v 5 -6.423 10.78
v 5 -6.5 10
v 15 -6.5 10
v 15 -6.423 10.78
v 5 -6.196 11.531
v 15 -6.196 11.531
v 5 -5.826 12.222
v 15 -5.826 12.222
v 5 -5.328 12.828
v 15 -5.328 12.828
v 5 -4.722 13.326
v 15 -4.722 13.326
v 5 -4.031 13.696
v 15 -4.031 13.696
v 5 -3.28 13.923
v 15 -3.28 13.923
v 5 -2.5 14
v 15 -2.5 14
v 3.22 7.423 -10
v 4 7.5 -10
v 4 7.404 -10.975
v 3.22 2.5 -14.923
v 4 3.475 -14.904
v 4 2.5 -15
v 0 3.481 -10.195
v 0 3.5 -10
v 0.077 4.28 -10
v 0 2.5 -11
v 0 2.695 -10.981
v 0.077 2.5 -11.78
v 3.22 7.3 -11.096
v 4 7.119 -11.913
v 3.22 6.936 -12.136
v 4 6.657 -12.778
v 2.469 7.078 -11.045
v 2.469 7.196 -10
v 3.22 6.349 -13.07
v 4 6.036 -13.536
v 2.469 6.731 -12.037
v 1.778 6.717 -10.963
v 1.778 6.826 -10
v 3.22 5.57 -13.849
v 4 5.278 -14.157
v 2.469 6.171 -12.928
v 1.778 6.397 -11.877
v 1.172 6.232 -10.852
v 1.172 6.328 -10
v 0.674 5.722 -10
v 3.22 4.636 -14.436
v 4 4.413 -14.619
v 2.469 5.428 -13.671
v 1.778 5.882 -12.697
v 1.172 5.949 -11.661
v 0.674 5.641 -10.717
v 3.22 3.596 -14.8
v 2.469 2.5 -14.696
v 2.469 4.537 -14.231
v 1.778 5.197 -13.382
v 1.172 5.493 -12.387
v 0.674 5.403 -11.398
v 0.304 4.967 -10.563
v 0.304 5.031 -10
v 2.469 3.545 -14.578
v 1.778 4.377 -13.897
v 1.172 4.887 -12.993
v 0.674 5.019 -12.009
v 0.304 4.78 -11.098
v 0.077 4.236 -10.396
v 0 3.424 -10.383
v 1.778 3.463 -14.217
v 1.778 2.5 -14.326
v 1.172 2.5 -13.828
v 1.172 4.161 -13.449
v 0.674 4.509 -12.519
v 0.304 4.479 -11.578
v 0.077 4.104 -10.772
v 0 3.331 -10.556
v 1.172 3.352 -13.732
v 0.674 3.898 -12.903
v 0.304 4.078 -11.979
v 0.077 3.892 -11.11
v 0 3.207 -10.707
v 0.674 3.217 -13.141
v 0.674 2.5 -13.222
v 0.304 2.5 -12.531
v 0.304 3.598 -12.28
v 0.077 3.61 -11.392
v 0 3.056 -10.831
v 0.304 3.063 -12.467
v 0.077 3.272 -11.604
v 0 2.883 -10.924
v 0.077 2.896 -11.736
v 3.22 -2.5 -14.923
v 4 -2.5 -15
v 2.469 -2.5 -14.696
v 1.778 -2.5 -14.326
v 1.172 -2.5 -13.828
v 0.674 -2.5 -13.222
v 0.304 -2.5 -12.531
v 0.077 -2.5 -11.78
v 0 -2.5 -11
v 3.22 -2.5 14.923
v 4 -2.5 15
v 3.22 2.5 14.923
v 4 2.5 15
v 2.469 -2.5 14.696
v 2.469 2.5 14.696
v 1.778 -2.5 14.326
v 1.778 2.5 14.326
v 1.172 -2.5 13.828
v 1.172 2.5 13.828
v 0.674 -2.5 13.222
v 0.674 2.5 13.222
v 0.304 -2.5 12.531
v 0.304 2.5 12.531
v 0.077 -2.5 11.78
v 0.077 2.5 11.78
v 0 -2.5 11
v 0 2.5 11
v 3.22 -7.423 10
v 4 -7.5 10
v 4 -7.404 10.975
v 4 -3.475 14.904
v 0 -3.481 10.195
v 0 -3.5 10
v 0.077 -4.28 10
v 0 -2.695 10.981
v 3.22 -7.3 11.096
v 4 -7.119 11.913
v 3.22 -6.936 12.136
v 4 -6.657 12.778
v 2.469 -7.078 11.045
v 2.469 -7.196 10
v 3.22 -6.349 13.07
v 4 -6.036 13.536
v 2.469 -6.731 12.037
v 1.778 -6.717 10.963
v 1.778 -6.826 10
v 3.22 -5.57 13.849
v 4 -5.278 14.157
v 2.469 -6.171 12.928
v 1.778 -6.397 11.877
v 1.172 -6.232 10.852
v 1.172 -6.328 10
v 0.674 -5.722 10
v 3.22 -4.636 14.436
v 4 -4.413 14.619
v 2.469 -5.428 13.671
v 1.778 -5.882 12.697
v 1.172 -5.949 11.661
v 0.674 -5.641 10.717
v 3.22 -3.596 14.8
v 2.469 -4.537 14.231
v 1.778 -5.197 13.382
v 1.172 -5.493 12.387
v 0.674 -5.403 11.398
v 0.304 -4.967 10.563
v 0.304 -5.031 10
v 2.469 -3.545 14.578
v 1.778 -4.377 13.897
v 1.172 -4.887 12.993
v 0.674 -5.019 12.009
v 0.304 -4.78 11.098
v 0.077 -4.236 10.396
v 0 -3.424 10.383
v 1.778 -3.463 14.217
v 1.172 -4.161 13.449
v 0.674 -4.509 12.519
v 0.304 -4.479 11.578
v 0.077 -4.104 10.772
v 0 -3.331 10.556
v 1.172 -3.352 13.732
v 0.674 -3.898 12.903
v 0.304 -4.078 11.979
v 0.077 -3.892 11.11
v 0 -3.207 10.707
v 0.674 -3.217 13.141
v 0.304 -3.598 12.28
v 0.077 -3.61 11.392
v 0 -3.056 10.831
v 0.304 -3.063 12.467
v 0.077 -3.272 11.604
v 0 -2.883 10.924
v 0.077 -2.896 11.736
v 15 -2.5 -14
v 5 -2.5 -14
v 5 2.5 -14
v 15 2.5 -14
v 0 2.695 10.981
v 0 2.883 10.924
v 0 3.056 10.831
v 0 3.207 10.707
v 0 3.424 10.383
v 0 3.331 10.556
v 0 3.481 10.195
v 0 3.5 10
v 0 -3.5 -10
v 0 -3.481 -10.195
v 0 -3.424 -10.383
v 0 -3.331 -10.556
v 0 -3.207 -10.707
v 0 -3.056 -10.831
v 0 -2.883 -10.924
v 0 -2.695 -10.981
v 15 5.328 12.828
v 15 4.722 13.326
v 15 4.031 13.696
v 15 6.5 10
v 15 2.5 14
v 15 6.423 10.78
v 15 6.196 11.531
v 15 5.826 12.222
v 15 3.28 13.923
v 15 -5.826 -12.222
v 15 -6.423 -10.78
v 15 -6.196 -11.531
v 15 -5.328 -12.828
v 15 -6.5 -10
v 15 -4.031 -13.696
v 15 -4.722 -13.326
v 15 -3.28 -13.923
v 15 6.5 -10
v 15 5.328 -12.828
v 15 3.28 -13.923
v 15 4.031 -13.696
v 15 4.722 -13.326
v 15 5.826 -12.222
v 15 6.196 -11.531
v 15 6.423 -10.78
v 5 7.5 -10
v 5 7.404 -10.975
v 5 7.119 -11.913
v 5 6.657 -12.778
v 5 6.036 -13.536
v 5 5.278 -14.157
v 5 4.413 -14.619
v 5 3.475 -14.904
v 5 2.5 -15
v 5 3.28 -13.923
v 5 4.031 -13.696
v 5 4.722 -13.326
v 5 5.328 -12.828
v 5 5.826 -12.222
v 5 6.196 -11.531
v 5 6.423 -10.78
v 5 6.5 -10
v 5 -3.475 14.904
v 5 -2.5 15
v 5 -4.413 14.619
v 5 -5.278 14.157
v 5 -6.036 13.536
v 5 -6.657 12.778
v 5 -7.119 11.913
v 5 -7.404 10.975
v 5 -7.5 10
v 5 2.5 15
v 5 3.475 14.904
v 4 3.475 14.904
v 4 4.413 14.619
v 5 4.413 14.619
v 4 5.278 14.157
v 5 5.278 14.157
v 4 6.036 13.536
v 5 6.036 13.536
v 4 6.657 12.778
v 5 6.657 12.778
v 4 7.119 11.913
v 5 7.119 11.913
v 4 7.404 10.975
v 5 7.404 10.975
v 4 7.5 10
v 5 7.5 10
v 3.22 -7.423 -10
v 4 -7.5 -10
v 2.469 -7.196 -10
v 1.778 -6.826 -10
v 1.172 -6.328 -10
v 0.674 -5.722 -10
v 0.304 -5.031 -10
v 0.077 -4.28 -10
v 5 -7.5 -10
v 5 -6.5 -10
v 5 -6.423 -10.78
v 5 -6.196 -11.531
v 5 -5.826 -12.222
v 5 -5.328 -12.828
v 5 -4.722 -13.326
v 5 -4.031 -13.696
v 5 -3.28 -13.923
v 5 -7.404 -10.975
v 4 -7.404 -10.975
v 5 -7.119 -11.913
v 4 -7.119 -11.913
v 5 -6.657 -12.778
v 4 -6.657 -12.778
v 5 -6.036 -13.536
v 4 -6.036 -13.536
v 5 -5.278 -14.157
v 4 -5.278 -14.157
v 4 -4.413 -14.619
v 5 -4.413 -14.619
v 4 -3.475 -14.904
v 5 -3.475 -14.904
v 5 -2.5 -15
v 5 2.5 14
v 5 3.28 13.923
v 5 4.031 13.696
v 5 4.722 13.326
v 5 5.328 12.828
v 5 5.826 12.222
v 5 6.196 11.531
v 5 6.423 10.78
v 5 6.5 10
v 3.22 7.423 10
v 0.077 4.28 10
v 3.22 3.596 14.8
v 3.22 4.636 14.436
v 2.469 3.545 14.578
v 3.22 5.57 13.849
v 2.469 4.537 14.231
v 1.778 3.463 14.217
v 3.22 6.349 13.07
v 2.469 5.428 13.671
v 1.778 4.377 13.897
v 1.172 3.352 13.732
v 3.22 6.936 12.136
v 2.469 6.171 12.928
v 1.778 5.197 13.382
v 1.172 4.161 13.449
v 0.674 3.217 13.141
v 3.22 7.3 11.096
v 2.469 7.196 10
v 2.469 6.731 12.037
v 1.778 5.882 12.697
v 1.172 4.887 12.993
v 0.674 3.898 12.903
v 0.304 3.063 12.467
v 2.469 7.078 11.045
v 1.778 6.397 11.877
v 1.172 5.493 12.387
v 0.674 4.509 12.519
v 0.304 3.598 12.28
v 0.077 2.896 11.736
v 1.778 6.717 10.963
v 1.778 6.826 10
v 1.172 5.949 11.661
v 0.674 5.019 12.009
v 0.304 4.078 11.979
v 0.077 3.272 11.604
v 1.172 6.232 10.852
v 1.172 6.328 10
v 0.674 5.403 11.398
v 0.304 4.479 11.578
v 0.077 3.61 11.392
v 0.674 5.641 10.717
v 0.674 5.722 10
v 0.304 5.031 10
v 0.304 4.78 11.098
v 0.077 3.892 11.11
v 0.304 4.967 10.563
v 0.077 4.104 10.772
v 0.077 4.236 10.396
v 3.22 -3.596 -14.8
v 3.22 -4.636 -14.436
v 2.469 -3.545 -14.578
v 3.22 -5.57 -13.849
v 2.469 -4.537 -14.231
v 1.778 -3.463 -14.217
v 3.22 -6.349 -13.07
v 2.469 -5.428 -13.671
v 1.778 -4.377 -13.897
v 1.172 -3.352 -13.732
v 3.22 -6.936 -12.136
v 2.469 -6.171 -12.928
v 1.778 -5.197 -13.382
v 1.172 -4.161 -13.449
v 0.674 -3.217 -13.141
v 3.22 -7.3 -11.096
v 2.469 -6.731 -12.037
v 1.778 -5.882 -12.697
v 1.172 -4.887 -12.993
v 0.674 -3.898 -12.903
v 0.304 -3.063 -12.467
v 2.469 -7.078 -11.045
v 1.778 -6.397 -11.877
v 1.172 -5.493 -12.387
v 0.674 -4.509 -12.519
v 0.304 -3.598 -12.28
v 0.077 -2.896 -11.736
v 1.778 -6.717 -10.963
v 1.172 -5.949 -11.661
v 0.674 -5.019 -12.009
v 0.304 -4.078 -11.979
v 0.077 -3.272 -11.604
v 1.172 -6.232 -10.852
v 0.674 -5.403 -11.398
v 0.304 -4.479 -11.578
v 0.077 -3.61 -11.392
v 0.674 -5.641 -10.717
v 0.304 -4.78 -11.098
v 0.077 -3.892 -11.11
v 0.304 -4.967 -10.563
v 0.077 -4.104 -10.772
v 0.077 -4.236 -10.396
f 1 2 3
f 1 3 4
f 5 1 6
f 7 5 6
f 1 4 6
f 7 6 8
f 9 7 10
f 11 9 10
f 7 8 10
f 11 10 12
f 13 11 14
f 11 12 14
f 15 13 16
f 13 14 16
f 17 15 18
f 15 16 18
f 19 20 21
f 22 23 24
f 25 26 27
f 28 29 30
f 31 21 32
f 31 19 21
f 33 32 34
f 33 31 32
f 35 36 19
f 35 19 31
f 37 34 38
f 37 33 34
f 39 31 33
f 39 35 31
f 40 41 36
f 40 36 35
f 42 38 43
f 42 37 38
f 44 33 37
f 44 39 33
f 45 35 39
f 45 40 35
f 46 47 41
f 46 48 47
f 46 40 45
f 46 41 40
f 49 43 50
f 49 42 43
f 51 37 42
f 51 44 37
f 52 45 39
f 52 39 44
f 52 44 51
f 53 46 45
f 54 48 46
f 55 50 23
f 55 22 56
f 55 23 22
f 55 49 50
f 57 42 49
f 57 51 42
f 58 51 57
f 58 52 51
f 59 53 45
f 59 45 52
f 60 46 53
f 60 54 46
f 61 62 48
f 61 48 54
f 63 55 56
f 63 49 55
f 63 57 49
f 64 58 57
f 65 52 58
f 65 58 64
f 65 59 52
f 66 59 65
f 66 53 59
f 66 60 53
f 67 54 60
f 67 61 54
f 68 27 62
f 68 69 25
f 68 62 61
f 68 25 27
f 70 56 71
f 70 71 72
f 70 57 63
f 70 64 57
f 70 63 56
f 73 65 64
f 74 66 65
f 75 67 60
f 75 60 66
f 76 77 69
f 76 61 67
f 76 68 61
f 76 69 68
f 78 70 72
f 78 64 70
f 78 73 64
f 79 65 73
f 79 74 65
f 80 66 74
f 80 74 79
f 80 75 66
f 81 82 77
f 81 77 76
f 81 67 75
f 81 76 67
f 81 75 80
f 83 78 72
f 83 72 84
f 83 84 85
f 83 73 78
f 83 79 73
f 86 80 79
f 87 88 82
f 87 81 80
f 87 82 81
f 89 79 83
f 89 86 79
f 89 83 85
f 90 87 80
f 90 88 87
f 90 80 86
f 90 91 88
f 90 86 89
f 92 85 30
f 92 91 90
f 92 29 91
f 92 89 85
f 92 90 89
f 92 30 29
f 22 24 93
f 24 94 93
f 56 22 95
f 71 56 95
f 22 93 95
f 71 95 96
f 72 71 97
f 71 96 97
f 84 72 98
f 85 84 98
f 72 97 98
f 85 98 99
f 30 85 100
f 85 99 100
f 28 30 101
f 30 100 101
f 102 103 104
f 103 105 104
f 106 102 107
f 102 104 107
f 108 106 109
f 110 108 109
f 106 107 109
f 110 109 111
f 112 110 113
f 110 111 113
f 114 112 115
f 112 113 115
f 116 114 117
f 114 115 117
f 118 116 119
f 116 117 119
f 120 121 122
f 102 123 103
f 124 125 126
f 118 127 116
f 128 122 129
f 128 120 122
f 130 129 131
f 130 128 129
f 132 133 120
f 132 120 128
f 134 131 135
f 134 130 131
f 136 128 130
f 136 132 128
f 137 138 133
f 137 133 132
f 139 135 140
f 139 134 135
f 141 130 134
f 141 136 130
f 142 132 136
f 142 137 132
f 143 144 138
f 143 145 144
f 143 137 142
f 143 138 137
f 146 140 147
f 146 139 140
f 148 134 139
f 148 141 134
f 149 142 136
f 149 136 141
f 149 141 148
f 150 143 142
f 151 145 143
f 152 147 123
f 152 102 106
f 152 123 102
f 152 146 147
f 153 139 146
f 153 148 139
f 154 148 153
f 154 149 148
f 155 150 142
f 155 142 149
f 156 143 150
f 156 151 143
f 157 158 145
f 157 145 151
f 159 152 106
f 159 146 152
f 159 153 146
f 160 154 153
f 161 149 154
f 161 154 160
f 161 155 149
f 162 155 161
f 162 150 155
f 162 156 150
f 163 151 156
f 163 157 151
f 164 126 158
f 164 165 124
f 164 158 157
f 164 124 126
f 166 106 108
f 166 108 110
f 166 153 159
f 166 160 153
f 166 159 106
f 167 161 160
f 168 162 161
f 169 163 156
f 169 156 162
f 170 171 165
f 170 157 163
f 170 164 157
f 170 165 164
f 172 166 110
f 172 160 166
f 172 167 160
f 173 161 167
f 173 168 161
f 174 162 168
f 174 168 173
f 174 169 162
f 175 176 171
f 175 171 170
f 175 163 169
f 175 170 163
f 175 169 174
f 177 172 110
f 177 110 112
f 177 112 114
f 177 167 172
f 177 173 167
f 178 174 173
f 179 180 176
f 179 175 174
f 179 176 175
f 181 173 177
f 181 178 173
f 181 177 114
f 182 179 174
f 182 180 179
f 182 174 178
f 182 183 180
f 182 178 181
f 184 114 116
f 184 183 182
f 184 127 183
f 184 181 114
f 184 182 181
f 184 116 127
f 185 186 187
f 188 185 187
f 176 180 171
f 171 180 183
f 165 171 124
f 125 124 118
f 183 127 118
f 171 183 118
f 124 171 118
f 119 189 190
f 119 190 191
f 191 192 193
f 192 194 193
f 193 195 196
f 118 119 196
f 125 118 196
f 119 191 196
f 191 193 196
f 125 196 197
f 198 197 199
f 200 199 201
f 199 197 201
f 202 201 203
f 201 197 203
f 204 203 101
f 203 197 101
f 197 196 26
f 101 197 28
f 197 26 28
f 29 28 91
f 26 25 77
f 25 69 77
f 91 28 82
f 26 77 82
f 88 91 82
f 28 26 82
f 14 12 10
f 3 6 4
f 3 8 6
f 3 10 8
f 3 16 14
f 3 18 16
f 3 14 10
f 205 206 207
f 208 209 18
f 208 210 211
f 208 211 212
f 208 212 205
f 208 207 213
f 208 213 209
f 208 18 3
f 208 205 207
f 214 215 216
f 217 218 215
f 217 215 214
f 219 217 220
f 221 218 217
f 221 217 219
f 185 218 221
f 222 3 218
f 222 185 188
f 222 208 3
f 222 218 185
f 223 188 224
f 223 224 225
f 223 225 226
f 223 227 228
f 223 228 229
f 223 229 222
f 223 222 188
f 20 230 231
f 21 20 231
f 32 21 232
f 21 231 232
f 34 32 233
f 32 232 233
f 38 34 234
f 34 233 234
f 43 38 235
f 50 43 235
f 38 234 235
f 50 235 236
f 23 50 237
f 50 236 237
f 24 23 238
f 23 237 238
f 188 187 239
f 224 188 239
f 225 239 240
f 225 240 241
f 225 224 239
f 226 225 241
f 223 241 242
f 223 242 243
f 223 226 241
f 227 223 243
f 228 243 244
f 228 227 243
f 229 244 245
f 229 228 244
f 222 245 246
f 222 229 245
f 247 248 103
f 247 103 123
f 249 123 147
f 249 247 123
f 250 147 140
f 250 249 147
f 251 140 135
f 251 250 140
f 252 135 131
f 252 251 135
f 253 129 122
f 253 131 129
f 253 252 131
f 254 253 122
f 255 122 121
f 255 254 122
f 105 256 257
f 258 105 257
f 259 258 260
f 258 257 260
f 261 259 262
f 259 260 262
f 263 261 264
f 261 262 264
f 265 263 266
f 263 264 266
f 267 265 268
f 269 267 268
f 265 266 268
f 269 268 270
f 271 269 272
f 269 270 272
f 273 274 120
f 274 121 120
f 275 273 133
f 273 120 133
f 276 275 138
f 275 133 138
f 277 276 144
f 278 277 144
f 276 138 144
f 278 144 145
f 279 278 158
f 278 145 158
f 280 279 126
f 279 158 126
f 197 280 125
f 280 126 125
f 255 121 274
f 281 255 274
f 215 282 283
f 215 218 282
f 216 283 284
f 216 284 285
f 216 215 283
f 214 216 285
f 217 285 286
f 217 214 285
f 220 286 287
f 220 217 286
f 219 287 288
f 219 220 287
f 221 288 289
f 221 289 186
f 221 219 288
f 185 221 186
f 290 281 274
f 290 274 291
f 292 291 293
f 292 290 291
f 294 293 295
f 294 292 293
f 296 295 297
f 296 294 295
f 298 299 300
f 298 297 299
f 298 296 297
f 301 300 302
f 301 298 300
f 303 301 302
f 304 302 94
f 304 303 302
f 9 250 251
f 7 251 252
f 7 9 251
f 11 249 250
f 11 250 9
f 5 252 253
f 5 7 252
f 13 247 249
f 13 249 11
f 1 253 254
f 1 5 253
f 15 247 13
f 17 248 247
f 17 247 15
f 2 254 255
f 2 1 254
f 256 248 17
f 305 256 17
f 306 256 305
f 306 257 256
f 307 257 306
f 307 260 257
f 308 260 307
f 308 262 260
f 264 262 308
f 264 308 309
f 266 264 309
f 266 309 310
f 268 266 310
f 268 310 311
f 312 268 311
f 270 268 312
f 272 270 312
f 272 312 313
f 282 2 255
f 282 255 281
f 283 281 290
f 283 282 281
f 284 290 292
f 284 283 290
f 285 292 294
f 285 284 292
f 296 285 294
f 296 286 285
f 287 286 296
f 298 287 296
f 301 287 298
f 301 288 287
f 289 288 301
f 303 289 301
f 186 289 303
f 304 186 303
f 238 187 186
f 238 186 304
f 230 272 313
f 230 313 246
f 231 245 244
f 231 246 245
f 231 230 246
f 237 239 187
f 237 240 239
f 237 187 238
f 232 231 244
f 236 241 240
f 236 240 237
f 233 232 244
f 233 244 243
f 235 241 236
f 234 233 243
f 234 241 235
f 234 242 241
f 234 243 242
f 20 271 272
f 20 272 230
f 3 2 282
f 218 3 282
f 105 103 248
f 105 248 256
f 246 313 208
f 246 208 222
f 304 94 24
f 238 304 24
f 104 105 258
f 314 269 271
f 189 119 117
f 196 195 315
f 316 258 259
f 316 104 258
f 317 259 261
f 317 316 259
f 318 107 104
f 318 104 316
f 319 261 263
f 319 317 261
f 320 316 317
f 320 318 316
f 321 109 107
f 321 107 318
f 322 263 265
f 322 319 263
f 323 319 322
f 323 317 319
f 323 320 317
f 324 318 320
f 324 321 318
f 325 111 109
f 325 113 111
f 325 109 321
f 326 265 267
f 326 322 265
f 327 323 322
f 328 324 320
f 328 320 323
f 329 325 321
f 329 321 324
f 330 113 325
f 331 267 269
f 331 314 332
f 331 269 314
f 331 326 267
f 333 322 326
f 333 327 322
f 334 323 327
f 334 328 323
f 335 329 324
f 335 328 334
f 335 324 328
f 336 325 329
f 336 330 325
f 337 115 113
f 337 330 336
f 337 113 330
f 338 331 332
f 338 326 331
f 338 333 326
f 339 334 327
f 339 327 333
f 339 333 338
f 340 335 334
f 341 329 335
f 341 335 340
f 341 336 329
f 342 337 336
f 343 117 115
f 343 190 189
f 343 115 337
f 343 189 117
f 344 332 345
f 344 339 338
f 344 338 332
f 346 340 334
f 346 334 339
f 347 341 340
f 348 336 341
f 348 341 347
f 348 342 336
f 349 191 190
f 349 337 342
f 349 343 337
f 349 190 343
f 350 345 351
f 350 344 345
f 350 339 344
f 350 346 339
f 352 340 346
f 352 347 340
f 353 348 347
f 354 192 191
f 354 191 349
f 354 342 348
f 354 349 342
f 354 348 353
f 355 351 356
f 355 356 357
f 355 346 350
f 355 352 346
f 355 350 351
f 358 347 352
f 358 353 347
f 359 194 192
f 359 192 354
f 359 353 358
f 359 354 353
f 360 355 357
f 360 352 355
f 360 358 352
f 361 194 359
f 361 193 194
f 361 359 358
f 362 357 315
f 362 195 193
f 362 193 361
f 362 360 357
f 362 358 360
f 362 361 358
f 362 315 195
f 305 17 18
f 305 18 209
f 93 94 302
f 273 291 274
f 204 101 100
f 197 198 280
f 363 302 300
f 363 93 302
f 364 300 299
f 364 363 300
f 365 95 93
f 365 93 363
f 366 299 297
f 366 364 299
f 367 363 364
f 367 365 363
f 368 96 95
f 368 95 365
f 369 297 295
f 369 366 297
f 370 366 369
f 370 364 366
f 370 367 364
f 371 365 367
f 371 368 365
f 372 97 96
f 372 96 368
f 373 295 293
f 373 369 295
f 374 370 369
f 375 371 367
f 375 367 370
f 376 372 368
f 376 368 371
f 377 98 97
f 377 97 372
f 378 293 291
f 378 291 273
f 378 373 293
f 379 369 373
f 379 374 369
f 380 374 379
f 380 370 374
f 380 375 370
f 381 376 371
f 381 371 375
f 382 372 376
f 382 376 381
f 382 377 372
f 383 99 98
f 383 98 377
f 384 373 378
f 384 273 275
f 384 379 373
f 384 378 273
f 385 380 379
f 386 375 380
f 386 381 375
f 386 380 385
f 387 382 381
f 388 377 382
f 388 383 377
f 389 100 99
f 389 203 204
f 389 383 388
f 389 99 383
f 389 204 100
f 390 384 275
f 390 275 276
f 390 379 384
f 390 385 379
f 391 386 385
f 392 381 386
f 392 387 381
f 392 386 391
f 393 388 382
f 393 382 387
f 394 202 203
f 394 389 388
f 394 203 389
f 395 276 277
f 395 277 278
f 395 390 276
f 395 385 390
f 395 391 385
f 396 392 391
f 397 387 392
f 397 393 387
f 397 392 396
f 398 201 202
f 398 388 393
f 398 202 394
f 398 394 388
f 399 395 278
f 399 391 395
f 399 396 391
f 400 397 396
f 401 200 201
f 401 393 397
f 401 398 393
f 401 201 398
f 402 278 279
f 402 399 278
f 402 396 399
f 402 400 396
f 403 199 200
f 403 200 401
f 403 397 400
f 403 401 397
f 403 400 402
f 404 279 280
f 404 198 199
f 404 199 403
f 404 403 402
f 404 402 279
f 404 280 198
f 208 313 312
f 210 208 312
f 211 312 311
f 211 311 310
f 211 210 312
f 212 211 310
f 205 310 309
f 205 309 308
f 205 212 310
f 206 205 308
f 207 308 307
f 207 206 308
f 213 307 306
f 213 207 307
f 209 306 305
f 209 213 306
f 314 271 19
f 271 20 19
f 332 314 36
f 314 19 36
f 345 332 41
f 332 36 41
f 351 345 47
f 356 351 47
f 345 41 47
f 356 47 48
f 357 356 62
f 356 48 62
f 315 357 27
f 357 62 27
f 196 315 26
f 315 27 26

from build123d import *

# Parameters (mm, degrees)
SKETCH_1_W      = 30
SKETCH_1_H      = 15
EXTRUDE_1_DEPTH = 5
SKETCH_2_W      = 28
SKETCH_2_H      = 13
EXTRUDE_2_DEPTH = 10
FILLET_2_R      = 4
FILLET_1_R      = 5
FILLET_3_R      = 4


with BuildPart() as part:
    # Эскиз1 → Бобышка-Вытянуть1 (new body)
    with BuildSketch(Plane(origin=(0, 0, 0), x_dir=(0, 0, -1), z_dir=(1, 0, 0))):
        Rectangle(SKETCH_1_W, SKETCH_1_H)
    extrude(amount=EXTRUDE_1_DEPTH)

    # Эскиз2 → Бобышка-Вытянуть2 (add)
    with BuildSketch(Plane(origin=(5, 0, 0), x_dir=(0, 0, -1), z_dir=(1, 0, 0))):
        Rectangle(SKETCH_2_W, SKETCH_2_H)
    extrude(amount=EXTRUDE_2_DEPTH)

    # Скругление2
    fillet_2_edges = [part.edges().sort_by_distance(p)[0] for p in [
        (10, 6.5, 14),
        (10, -6.5, 14),
        (10, -6.5, -14),
        (10, 6.5, -14),
    ]]
    fillet(fillet_2_edges, radius=FILLET_2_R)

    # Скругление1
    fillet_1_edges = [part.edges().sort_by_distance(p)[0] for p in [
        (2.5, 7.5, 15),
        (2.5, 7.5, -15),
        (2.5, -7.5, -15),
        (2.5, -7.5, 15),
    ]]
    fillet(fillet_1_edges, radius=FILLET_1_R)

    # Скругление3
    fillet_3_edges = [part.edges().sort_by_distance(p)[0] for p in [
        (0, 7.5, 0),
        (0, 0, 15),
        (0, 0, -15),
        (0, -7.5, 0),
        (0, 6.035533906, 13.535533906),
        (0, -6.035533906, 13.535533906),
        (0, -6.035533906, -13.535533906),
        (0, 6.035533906, -13.535533906),
    ]]
    fillet(fillet_3_edges, radius=FILLET_3_R)


solid = part.part
